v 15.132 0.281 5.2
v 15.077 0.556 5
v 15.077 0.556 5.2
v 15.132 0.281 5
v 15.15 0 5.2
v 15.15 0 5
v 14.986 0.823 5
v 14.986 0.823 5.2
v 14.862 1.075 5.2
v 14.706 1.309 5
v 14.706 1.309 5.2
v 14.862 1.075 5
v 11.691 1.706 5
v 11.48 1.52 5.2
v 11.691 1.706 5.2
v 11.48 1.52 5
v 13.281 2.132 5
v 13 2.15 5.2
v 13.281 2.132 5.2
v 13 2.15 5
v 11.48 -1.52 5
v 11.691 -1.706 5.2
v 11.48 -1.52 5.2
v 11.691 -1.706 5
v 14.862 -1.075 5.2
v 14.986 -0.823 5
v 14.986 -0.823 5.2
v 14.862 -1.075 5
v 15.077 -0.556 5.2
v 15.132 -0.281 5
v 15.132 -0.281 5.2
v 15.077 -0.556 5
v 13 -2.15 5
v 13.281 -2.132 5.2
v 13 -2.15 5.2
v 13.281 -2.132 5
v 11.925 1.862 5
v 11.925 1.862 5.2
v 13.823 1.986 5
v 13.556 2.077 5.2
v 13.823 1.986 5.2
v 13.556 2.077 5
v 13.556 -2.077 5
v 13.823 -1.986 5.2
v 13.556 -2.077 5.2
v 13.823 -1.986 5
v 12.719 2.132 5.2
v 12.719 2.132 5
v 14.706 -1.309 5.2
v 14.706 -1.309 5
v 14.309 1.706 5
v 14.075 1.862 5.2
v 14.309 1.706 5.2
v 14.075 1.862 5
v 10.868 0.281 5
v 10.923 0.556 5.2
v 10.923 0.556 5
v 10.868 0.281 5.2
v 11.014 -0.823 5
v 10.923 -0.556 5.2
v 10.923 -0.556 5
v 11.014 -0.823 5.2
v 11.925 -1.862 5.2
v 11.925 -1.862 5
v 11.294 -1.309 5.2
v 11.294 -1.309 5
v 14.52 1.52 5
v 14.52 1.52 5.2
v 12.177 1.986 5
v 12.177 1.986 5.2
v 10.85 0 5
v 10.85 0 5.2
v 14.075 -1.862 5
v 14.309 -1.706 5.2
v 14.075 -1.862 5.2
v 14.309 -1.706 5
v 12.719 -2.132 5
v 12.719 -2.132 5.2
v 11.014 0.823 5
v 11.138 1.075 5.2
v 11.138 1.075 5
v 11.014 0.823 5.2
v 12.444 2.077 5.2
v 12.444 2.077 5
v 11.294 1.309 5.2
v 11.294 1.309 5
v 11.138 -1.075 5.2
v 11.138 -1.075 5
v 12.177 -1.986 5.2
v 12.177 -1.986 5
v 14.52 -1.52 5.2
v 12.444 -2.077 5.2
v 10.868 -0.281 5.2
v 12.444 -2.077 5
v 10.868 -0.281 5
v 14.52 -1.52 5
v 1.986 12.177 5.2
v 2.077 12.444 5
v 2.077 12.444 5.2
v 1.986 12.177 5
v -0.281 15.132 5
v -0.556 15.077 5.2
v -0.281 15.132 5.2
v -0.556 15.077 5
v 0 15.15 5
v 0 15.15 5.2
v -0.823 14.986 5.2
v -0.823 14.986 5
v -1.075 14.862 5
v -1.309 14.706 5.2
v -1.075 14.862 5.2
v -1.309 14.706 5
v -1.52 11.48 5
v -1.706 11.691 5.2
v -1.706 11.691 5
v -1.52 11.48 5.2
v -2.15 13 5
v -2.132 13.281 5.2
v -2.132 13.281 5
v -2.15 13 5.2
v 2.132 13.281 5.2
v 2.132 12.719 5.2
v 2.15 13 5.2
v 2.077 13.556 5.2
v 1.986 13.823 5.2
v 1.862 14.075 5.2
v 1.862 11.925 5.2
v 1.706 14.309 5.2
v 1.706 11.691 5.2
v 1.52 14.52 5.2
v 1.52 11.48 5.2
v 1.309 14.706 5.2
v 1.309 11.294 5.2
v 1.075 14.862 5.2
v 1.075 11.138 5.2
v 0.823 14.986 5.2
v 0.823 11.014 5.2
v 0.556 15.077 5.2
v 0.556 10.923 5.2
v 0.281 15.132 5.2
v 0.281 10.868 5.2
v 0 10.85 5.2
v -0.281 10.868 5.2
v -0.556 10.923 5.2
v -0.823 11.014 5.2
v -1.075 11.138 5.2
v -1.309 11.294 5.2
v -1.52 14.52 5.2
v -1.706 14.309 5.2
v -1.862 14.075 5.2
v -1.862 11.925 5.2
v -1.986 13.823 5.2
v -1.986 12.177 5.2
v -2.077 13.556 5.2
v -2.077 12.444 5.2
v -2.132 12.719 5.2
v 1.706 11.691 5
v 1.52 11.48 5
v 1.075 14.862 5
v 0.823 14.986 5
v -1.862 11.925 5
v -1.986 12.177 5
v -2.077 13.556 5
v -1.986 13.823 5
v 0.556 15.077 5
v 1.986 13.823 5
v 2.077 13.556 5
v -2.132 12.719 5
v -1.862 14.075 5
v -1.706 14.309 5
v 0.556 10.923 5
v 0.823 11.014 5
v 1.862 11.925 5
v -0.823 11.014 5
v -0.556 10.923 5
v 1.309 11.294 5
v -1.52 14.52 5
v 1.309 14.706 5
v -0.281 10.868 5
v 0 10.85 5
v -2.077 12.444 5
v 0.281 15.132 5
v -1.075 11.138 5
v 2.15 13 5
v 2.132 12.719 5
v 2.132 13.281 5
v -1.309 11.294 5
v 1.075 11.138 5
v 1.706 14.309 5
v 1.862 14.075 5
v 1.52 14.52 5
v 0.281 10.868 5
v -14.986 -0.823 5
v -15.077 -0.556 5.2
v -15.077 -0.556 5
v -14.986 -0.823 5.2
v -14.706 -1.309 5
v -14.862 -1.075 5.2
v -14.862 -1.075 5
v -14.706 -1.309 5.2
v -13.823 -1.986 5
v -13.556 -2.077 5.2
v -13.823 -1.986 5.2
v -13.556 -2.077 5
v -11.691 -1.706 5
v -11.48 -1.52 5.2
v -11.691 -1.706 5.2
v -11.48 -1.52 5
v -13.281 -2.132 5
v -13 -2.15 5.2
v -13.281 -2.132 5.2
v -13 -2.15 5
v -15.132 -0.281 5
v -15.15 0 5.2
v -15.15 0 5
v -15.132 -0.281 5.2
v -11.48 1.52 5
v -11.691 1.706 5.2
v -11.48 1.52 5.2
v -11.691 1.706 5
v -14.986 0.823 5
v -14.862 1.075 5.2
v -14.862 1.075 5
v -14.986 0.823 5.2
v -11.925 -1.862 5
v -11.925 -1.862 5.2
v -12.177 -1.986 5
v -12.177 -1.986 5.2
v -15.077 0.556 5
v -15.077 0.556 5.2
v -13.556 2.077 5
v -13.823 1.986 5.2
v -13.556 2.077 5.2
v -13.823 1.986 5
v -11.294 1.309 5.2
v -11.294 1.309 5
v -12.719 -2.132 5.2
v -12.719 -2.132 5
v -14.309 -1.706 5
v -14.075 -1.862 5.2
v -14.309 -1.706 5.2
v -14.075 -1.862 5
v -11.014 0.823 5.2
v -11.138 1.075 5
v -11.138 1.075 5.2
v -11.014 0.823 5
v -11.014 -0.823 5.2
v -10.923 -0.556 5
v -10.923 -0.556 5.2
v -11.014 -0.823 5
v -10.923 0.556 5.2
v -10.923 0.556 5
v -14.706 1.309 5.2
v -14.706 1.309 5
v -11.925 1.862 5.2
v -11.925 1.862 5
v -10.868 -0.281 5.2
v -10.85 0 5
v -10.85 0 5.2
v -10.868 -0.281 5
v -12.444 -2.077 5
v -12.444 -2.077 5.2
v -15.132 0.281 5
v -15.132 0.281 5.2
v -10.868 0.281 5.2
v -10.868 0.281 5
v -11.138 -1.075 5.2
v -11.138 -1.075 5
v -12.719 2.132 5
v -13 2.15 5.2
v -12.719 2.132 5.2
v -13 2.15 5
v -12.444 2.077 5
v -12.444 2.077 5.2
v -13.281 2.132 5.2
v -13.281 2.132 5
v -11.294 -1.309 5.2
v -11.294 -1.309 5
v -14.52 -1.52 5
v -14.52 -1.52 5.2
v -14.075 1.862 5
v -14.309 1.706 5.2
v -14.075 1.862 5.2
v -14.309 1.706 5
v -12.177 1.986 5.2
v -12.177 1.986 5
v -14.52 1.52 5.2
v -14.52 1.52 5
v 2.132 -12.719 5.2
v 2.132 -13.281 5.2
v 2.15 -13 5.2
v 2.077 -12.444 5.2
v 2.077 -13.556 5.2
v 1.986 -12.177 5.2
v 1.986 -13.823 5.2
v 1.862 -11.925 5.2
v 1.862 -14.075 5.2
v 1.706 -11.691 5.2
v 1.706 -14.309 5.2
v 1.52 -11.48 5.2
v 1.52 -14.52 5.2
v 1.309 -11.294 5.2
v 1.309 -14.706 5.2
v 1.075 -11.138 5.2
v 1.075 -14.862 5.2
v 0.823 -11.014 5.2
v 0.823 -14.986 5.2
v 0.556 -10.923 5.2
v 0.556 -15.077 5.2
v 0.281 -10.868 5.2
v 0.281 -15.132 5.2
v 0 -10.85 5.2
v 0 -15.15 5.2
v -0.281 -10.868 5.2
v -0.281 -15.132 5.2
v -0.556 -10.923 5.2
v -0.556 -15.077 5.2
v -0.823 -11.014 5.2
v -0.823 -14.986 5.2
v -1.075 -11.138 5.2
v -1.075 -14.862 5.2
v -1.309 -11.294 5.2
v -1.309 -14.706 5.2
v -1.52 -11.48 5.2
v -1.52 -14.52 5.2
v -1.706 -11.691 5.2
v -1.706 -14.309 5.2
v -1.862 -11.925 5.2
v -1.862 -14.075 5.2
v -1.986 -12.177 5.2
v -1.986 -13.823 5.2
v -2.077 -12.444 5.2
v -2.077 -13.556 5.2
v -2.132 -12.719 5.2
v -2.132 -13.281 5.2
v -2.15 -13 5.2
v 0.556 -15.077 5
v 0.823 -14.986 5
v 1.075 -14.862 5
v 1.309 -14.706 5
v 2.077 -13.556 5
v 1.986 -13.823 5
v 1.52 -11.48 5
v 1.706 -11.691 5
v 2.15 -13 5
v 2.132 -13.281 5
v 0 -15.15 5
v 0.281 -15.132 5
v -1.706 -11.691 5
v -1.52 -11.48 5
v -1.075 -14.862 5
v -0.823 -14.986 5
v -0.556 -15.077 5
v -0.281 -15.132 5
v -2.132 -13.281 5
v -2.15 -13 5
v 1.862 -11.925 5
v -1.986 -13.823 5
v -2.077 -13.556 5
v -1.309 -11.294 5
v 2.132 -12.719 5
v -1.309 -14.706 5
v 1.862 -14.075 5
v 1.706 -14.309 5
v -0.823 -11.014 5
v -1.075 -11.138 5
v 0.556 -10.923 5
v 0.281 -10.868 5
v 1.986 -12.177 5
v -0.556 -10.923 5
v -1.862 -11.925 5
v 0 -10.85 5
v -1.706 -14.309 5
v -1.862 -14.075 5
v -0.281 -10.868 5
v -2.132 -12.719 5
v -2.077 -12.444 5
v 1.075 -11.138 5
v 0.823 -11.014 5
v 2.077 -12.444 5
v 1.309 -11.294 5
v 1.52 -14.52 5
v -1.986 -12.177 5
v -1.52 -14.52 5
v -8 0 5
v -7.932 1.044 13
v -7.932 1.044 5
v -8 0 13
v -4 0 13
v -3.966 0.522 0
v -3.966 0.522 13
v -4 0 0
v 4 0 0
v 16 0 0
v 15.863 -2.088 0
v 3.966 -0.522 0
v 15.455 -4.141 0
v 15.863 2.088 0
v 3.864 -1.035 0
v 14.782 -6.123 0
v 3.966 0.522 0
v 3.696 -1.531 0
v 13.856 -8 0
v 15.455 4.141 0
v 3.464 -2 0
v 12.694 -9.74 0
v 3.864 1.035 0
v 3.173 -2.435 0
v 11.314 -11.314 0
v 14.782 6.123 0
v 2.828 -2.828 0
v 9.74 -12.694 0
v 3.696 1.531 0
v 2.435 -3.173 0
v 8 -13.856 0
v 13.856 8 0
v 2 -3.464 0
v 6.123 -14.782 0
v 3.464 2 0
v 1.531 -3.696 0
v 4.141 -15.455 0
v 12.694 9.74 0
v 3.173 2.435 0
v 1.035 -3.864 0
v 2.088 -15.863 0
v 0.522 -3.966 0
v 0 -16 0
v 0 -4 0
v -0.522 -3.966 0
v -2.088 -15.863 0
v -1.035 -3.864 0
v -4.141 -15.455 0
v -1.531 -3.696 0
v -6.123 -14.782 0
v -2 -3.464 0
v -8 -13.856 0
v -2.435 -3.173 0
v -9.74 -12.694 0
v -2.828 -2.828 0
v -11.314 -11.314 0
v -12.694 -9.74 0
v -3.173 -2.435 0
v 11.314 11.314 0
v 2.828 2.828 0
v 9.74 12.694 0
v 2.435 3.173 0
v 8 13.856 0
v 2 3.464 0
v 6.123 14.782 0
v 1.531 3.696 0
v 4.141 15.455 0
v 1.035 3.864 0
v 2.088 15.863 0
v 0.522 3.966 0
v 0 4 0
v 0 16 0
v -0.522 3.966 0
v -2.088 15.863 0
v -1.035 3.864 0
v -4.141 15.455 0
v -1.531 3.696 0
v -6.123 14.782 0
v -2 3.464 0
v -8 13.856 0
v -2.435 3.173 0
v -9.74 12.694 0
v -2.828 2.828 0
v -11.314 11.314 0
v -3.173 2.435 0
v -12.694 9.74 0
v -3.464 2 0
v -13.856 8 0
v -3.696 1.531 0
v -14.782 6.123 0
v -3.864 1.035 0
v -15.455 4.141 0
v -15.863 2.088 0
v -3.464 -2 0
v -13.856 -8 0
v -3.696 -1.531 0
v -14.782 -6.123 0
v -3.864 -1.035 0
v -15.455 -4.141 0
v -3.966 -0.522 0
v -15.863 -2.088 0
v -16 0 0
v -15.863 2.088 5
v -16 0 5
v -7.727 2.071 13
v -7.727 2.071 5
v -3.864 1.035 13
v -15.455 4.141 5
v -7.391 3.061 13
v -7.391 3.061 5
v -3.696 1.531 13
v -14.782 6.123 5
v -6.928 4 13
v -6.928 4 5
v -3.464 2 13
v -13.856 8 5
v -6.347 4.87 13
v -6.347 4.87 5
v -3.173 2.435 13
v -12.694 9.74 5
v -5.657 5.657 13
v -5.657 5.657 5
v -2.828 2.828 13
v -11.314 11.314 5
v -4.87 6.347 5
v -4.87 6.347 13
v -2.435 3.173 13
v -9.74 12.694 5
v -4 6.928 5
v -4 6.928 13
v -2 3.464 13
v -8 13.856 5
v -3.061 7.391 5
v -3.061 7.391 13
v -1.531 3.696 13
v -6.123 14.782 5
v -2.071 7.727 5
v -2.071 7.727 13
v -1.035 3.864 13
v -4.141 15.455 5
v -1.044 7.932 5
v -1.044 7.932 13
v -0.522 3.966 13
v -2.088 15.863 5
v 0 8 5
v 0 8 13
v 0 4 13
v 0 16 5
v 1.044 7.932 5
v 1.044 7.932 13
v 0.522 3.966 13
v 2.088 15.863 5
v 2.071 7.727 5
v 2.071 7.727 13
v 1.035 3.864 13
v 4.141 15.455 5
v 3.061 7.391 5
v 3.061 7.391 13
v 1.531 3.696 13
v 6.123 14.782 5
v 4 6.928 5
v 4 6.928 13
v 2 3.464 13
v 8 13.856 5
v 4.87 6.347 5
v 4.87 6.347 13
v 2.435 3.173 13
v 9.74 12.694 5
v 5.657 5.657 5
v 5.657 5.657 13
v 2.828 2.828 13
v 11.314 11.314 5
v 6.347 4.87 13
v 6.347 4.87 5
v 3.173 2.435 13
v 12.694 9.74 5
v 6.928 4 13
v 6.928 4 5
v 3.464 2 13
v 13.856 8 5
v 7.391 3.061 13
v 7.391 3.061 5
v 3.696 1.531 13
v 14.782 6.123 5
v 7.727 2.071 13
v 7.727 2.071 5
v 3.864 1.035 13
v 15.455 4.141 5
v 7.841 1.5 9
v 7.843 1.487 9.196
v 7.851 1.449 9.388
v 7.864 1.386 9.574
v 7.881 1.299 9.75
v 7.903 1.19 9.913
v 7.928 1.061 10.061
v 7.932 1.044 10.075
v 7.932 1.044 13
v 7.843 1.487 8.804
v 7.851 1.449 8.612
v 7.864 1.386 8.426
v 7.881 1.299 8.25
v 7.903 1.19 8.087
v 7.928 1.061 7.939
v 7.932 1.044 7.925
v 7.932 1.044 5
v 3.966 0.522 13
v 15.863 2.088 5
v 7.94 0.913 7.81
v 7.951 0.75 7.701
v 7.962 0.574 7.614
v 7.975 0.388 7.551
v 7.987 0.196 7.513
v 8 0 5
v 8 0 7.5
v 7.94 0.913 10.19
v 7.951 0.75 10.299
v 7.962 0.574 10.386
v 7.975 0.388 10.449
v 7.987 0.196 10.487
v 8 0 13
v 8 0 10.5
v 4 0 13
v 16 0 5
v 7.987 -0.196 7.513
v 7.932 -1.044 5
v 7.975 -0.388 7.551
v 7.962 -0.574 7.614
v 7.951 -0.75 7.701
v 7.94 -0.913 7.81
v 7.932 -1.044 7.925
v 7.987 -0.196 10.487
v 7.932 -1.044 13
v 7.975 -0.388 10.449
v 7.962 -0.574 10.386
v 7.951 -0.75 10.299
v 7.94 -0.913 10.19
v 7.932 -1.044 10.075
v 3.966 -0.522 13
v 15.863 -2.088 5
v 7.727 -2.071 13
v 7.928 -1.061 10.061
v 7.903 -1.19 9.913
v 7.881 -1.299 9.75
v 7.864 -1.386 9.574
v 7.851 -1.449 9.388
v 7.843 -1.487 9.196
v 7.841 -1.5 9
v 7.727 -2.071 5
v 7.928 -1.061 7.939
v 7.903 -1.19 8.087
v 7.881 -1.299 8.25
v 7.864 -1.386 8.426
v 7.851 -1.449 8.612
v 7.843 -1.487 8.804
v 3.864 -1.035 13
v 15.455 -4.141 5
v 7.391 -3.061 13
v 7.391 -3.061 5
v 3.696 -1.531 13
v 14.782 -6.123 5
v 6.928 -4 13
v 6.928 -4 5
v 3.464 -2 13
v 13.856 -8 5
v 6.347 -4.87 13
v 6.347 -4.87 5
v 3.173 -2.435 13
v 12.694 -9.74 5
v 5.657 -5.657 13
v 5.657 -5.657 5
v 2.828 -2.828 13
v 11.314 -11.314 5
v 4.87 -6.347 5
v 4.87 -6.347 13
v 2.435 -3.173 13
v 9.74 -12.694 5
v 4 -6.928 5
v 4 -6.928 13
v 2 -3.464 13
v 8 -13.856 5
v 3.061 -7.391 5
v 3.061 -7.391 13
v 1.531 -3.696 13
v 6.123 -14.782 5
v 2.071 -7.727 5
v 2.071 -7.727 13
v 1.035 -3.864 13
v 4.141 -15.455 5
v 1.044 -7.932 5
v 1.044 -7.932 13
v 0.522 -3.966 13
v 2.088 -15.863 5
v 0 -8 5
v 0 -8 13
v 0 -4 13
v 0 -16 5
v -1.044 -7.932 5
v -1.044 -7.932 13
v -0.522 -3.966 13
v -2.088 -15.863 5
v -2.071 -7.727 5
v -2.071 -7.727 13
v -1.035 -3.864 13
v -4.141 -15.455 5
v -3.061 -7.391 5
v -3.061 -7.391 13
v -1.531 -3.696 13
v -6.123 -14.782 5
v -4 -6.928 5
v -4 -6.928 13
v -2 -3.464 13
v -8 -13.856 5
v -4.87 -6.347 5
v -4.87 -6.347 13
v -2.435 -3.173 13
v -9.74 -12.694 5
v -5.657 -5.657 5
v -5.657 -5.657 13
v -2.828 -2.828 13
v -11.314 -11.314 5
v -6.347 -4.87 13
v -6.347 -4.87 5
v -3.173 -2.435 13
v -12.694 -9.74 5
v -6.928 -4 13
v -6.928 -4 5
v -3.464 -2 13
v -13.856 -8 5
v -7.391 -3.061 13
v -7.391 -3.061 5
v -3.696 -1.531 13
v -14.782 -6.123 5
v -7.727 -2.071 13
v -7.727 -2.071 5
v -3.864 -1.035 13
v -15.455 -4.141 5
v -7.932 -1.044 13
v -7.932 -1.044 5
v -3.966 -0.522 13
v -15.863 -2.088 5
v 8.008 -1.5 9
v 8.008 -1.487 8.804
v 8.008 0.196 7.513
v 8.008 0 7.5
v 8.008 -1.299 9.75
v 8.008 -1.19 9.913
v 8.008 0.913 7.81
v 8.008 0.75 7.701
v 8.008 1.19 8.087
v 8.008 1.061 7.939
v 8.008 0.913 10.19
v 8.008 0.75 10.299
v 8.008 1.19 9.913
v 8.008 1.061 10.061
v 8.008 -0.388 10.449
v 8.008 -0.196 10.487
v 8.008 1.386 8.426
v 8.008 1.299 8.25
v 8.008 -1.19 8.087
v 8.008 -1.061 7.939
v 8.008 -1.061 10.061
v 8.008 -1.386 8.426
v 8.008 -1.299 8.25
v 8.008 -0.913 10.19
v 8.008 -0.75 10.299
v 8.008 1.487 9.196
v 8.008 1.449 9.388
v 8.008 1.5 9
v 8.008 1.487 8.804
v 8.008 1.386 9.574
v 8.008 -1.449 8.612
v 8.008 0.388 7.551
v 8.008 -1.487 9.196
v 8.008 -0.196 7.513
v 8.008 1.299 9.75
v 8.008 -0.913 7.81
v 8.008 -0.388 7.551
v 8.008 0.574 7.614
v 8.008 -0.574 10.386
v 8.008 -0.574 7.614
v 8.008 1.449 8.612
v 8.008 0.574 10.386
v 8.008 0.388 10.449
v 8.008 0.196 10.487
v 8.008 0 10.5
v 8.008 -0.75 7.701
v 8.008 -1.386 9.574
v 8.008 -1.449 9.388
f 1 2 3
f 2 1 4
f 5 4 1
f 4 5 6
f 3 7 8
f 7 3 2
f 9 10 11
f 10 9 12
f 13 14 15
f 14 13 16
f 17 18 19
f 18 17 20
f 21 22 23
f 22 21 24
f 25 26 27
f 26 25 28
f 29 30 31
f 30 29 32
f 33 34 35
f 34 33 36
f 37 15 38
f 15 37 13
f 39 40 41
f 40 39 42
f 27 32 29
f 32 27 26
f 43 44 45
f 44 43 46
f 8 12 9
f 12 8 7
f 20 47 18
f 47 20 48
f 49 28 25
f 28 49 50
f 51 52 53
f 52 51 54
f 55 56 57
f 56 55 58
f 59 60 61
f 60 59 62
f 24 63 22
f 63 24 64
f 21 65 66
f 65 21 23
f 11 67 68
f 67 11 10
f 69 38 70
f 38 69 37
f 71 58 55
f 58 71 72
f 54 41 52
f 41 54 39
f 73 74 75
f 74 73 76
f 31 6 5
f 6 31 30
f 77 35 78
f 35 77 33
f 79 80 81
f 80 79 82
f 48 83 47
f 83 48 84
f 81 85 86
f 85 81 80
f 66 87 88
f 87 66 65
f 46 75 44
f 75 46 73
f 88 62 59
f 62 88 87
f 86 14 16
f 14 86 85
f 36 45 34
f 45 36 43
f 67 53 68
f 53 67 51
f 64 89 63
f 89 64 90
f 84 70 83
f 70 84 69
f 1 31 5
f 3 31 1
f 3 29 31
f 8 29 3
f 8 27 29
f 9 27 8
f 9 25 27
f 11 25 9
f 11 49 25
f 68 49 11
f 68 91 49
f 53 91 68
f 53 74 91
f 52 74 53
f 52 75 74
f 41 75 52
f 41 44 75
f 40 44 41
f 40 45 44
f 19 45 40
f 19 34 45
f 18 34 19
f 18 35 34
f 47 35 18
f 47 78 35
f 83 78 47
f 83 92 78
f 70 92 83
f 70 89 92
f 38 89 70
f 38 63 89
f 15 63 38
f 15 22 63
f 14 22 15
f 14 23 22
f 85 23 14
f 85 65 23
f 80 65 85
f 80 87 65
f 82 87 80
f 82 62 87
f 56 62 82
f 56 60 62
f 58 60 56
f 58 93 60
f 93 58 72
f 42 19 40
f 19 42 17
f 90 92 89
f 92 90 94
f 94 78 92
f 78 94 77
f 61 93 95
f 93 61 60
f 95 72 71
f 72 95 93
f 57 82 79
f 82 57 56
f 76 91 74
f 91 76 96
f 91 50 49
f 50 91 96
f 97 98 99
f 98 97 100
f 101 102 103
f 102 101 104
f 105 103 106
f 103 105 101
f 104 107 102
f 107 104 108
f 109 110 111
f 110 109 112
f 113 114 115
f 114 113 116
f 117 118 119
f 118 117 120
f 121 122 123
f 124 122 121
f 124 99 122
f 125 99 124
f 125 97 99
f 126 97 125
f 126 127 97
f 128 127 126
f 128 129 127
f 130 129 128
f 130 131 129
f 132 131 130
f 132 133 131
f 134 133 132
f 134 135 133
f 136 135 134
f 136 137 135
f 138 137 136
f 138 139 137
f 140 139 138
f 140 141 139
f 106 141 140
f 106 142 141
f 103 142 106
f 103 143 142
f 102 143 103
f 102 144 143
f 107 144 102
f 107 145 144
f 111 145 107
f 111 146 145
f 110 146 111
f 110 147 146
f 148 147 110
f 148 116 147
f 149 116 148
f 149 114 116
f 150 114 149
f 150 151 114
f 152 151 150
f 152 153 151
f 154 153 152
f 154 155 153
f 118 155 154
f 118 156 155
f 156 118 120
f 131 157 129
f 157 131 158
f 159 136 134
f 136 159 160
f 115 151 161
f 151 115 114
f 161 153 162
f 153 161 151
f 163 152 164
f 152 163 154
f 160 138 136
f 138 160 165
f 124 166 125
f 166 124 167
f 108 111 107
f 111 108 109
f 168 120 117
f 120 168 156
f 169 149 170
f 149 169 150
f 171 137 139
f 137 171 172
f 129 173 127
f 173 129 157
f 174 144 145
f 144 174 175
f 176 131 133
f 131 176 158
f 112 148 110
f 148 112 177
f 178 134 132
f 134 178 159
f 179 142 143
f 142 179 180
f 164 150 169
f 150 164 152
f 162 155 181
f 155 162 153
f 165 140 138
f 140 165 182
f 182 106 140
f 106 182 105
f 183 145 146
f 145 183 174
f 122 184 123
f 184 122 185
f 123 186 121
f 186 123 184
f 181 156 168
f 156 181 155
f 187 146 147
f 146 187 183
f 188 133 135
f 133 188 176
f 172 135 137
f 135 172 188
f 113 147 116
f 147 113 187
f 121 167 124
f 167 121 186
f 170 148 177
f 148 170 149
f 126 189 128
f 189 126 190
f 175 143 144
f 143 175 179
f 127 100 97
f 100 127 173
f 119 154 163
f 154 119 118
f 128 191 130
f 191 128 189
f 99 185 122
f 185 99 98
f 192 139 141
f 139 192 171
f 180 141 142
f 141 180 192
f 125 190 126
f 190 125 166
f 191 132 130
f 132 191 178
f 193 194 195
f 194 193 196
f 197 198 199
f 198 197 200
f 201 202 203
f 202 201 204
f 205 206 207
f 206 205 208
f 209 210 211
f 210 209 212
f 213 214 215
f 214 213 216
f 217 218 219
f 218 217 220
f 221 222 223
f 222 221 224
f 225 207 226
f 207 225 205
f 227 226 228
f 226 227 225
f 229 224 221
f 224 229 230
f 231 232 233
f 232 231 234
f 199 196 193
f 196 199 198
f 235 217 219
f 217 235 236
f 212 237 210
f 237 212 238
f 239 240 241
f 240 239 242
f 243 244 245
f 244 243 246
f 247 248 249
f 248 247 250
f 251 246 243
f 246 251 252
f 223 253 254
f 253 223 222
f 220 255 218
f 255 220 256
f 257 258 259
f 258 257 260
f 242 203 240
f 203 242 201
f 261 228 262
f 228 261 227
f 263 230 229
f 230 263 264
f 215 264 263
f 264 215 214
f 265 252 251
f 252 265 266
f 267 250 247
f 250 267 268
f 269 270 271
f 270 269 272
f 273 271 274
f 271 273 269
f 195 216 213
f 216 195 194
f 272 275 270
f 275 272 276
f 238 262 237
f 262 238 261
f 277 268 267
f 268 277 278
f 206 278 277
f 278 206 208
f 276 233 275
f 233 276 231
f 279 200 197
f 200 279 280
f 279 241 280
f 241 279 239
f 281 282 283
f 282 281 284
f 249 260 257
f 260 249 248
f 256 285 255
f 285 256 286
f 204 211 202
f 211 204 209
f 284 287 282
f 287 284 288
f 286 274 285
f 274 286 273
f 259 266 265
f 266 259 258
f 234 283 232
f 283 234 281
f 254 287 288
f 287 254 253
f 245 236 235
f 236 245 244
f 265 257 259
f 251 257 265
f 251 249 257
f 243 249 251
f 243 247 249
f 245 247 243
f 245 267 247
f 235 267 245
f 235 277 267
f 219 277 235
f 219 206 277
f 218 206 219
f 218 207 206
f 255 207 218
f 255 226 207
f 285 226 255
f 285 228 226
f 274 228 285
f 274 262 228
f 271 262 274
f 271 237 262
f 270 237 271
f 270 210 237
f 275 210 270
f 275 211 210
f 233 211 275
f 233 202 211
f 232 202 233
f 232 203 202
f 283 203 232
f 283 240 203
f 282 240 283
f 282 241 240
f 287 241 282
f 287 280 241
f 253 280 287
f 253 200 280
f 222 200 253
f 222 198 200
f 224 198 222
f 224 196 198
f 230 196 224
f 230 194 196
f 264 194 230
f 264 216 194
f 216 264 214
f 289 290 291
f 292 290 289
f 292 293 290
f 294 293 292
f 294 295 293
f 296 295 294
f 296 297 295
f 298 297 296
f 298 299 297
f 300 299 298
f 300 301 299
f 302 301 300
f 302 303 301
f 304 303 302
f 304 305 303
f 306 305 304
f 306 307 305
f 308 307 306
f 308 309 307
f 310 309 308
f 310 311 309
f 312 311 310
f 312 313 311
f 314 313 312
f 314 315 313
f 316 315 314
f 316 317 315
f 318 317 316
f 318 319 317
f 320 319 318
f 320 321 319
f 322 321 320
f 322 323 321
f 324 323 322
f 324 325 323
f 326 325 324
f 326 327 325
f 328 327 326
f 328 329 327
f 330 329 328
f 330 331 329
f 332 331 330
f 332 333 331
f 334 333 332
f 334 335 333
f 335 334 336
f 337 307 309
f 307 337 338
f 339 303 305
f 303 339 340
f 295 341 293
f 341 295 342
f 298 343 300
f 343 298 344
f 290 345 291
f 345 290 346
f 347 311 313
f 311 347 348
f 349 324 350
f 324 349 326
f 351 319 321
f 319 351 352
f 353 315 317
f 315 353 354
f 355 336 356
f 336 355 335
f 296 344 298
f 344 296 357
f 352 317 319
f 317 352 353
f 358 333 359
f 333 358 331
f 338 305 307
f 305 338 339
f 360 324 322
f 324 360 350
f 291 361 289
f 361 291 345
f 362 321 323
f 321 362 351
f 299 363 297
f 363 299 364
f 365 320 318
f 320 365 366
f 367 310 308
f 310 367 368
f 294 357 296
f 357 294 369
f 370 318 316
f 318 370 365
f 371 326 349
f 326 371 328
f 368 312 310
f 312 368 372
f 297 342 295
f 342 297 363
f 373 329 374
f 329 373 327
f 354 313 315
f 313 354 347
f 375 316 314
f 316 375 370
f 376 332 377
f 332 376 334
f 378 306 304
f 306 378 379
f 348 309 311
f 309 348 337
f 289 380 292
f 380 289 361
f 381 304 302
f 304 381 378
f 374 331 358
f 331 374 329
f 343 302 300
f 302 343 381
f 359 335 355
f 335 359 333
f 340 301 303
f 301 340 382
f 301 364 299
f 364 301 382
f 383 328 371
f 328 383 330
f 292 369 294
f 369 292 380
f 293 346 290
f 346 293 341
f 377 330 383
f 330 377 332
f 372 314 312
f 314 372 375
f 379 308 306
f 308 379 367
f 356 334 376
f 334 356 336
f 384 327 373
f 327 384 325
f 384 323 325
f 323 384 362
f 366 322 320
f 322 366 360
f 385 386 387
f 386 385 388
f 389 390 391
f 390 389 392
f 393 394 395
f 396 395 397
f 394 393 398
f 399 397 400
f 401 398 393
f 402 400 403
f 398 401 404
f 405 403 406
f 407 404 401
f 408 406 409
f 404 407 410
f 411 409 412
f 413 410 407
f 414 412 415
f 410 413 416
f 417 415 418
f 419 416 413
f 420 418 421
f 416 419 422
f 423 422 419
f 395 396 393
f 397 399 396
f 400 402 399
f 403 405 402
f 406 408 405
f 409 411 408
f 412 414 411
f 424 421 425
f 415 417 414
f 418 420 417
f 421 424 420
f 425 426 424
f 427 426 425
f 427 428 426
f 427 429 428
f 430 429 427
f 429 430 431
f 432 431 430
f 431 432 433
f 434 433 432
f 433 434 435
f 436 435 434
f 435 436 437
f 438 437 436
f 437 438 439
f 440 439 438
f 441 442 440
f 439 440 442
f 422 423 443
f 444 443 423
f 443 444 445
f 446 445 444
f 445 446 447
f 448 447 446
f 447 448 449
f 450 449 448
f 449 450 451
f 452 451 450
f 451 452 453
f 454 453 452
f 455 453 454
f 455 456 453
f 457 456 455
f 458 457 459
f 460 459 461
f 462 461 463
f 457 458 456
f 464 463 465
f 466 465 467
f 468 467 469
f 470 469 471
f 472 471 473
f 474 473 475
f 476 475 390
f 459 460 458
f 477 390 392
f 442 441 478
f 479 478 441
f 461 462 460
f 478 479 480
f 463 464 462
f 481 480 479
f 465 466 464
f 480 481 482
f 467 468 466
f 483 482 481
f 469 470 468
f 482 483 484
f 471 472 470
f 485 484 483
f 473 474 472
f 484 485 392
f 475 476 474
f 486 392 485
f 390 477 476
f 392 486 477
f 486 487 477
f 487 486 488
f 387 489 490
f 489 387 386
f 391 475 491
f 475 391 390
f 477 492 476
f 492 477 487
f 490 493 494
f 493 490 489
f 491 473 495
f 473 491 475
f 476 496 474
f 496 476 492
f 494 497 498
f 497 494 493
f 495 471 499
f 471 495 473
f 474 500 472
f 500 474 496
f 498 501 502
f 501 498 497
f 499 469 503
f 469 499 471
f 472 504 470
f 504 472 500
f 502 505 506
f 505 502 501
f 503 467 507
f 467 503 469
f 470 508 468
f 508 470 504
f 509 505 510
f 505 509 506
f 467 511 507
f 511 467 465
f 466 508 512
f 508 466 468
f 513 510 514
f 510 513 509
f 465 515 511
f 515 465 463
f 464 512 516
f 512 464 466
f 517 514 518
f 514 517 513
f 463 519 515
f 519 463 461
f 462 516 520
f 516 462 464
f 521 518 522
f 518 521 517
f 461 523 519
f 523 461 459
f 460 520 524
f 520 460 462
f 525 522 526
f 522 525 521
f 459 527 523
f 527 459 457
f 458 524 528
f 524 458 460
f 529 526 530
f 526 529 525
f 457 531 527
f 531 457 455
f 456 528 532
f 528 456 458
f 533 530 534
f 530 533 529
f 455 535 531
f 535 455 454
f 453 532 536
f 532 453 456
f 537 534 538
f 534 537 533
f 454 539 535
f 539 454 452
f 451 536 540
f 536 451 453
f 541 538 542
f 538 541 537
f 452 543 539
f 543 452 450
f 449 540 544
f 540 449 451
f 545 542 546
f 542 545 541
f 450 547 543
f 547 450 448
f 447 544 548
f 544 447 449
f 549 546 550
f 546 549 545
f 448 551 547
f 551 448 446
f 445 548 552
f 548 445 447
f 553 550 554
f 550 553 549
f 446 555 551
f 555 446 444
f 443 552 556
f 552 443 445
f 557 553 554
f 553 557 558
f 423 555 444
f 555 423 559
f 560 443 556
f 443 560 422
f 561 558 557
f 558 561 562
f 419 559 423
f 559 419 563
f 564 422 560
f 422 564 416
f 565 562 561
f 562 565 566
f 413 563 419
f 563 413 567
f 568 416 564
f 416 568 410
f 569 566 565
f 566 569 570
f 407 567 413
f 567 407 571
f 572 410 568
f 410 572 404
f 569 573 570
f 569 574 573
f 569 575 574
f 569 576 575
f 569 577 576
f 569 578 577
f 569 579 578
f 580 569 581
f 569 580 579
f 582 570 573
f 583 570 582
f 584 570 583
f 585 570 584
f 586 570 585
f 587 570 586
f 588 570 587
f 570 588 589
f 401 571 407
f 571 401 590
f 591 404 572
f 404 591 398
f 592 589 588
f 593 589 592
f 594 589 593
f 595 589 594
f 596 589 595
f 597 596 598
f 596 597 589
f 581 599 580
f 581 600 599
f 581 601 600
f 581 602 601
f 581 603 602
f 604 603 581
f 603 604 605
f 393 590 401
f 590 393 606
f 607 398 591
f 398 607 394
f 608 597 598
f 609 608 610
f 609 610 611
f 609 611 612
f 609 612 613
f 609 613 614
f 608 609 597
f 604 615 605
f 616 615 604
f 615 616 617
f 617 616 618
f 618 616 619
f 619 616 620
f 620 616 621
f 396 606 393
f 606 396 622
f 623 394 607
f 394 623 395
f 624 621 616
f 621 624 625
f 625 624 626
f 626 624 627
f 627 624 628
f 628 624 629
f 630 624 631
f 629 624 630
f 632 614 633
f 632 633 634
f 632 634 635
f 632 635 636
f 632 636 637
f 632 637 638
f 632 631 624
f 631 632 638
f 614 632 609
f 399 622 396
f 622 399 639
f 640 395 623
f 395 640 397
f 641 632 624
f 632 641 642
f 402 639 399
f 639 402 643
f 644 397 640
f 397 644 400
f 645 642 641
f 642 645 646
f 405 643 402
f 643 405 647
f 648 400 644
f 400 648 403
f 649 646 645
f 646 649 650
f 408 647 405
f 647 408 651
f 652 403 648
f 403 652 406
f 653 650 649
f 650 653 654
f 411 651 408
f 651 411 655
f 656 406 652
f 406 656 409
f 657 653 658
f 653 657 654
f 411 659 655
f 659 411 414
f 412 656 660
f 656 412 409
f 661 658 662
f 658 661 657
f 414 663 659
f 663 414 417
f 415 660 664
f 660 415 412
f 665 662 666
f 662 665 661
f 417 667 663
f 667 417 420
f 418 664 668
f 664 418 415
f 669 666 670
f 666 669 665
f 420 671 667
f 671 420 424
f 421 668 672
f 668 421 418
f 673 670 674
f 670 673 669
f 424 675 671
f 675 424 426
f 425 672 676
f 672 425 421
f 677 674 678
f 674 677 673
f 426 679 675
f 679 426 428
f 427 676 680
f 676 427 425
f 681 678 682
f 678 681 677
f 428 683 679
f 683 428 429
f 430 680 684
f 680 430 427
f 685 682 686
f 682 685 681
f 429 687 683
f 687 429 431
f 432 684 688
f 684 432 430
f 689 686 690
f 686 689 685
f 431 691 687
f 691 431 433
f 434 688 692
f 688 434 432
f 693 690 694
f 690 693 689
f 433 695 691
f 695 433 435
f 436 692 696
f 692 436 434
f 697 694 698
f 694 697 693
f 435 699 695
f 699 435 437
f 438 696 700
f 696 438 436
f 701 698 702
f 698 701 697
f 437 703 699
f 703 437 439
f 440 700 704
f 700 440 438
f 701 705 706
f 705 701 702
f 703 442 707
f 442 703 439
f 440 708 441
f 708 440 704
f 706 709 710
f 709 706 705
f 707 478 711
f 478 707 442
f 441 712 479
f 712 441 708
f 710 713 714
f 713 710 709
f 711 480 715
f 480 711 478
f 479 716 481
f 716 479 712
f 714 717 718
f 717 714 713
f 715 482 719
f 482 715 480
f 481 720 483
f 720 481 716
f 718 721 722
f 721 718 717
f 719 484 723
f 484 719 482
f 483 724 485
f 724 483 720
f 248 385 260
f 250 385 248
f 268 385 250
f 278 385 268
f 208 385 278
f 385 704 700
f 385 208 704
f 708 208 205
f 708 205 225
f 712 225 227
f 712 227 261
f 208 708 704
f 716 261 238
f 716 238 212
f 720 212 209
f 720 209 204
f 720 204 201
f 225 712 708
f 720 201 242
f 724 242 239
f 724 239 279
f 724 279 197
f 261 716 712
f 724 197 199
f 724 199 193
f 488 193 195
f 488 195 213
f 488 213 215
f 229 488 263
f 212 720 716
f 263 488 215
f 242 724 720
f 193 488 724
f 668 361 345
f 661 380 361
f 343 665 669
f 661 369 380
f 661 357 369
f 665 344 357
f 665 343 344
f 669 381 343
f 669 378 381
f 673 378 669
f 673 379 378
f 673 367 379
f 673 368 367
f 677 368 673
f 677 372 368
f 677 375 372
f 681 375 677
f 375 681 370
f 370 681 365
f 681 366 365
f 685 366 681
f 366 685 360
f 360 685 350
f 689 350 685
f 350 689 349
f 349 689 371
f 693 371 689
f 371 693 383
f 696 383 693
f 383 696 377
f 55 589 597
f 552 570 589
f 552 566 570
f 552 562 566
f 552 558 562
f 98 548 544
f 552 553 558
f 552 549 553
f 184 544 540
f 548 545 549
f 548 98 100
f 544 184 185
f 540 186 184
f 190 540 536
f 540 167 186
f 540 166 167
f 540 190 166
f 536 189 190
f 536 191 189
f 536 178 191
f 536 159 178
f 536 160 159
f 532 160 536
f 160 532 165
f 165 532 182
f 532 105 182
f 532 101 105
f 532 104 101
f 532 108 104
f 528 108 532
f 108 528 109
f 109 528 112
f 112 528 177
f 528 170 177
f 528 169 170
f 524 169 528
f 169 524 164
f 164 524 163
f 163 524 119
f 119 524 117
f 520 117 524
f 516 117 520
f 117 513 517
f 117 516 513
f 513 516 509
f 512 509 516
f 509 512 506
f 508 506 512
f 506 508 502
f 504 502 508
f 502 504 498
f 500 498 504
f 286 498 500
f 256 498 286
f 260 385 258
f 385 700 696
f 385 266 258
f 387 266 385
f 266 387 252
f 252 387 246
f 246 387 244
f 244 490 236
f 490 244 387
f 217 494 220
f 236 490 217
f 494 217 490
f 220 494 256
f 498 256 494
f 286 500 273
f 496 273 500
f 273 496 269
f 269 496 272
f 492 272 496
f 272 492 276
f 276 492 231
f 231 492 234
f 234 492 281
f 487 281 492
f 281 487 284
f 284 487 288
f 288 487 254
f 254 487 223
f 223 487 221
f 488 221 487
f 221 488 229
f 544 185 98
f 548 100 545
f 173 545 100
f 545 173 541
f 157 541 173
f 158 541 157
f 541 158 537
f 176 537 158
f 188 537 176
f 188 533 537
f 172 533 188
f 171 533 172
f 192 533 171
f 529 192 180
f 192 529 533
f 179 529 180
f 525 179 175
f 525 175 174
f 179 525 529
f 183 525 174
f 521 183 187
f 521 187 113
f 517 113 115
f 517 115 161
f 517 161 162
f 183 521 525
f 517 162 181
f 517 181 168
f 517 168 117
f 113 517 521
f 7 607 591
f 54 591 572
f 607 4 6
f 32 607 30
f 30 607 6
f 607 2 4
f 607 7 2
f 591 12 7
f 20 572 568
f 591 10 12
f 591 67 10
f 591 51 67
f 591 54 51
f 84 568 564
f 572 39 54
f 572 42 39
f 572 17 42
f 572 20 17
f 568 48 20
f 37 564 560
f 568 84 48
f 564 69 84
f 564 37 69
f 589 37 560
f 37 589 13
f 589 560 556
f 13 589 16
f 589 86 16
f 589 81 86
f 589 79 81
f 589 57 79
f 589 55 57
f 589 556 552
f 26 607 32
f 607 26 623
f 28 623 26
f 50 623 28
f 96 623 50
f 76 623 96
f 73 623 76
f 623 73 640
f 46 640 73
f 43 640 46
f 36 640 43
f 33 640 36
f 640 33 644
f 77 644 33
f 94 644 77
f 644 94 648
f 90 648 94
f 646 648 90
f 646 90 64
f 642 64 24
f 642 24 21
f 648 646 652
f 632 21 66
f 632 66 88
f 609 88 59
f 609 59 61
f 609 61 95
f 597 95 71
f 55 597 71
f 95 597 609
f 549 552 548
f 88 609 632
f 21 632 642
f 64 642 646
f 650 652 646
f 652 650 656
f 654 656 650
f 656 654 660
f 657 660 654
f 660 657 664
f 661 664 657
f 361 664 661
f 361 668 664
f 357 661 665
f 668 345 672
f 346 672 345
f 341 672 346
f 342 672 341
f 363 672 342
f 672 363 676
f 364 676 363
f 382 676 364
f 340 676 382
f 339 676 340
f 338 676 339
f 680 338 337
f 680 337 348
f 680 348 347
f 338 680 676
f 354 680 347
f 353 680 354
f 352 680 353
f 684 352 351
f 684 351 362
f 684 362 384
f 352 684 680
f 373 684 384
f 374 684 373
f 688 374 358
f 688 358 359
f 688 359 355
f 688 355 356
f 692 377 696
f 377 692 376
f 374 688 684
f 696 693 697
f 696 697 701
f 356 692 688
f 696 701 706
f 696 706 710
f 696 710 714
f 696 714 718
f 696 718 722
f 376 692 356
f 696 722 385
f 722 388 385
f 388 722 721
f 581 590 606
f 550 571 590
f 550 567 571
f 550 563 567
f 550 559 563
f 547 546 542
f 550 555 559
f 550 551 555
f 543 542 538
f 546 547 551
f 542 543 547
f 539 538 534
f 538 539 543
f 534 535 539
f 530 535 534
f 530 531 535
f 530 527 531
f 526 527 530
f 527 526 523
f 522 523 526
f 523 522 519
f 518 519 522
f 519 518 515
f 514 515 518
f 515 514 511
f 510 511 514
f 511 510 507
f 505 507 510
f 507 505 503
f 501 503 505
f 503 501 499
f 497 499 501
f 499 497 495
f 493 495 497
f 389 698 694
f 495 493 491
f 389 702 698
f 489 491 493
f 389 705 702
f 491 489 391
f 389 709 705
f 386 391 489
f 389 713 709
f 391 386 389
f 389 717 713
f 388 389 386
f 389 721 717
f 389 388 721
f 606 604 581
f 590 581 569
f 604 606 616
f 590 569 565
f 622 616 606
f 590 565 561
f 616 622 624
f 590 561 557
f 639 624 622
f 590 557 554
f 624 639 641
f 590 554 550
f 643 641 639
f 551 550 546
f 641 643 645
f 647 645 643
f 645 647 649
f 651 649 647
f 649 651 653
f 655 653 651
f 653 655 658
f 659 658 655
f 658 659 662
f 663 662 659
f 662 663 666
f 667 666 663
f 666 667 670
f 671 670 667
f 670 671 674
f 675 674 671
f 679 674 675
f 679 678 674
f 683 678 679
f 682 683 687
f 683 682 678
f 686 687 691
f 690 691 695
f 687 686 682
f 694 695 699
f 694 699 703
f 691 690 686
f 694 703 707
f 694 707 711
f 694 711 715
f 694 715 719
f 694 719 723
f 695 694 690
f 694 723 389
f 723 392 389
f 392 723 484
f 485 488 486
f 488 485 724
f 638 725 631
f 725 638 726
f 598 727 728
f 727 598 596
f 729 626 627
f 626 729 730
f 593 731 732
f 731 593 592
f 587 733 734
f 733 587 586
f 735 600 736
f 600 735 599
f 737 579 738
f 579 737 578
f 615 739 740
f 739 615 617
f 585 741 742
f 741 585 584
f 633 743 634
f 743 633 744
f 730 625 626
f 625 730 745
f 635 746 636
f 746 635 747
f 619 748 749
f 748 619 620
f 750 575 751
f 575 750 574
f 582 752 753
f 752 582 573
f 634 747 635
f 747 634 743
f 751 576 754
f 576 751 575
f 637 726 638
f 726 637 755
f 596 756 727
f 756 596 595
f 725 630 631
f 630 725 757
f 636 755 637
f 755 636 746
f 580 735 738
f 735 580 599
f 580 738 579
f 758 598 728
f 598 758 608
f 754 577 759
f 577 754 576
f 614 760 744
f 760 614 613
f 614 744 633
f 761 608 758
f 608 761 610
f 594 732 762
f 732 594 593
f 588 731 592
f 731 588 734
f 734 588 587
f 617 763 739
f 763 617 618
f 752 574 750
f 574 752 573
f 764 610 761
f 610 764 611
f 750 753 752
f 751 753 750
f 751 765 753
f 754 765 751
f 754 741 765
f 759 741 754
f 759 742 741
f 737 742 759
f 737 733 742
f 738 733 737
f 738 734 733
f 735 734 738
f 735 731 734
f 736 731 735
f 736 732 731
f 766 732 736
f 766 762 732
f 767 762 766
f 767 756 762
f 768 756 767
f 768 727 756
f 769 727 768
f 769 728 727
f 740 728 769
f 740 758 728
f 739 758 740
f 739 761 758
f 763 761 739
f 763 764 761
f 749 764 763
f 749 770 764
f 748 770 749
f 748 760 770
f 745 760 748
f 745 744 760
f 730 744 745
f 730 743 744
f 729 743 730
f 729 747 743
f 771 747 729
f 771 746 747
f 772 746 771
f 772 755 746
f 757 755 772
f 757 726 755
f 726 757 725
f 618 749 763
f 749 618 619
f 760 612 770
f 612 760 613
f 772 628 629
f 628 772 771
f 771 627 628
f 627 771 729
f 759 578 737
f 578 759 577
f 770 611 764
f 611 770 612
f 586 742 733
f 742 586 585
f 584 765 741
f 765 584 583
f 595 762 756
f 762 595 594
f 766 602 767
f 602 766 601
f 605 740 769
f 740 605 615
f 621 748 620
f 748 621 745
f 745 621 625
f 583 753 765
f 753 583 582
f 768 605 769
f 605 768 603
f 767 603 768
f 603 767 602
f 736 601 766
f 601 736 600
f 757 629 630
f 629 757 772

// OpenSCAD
// file: ../config.scad
// SCARA 로봇 공통 사양(specification) — 모든 부품 파일에서 include해 사용한다.

$fn = 48;

// ── 공차(tolerance) ──
print_clearance = 0.2;   // FDM 출력 끼워맞춤(fit) 여유 — 압입(press-fit) 자리 제외
eps             = 1/128; // 미세 겹침(epsilon) — 접하는 솔리드를 살짝 겹쳐 동일면(coincident face) z-파이팅 방지

// ── FDM 출력 사양(print specification) ──
fdm_layer_h       = 0.28;   // 레이어 높이(layer height) — 슬라이서(slicer) 설정값과 일치시킨다.
fdm_shoulder_layers = 6;   // 숄더(shoulder) 최소 레이어 수 — FDM 최소 구조 벽(0.4mm 노즐 3겹 ~1.2mm) 기준 하한값.

// ── 레이아웃(layout) ──
// layout_margin — 플레이트 위 부품 배치 공통 여백(margin). 부품 외곽선에서
// 사방으로 주는 값 → 부품끼리는 2*margin 이격, 외곽 가장자리도 margin 확보.
layout_margin = 4;

// ── 시트 형상(seat geometry) ──
// seat_shoulder_t — fdm_layer_h · fdm_shoulder_layers 파생. 슬라이서 설정 변경 시 자동 연동.
seat_shoulder_t = fdm_layer_h * fdm_shoulder_layers;
// main file
/*
 * flange_couplings.scad - 플랜지 커플링(flange coupling) 기성품(vitamin)
 *
 * 매끈 봉(round shaft)을 중앙 허브(hub)의 멈춤나사(grub screw)로 죄고, 볼트원
 * (bolt circle)이 있는 원형 플랜지를 판에 평면 체결해 봉을 판에 수직으로
 * 고정한다. SCARA_KINEMATICS.md의 COLUMN_LINK에서 가이드 로드(guide rod) 끝을
 * 가이드 플레이트에 고정(FLANGE_COUPLINGS)한다. NopSCADlib에 없어 로컬로 둔다.
 *
 * Z 브레이크포인트(Z breakpoint) 최적화: 회전 대칭인 플랜지+허브+보어를 환형
 * (annular) 단면 한 개의 rotate_extrude로 만든다. 볼트 홀·멈춤나사는
 * difference 없이 어두운 마커(marker)로 배치한다.
 *
 * 좌표계: 봉 축(axis) = Z, 플랜지 바닥(판 접촉면) = z=0, 허브는 +z.
 */

include <../config.scad>

/* --- 색상(cosmetic) --- */
c_body		= [0.74, 0.75, 0.77];	/* 아연도금강(zinc steel) 본체 */
c_hole		= [0.12, 0.12, 0.13];	/* 볼트 홀·멈춤나사 음각 마커 */

/*
 * 플랜지 커플링(제네릭) — 보어·플랜지·볼트원·허브 치수를 받는다. 회전체는
 * 환형 단면 단일 rotate_extrude, 볼트 홀·멈춤나사 마커는 그대로 배치한다.
 *   bore_d        봉 보어(shaft bore) 지름
 *   flange_d/t    플랜지 외경·두께
 *   bolt_circle_d 마운팅 볼트원(bolt circle) 지름
 *   bolt_n        마운팅 홀 개수
 *   hub_d/h       클램프 허브 외경·높이(플랜지 위)
 */
module flange_coupling(bore_d, flange_d, flange_t, bolt_circle_d, bolt_n,
		       hub_d, hub_h)
{
	br	= bore_d / 2;
	top	= flange_t + hub_h;
	bolt_mark_d = 4.3;	/* 마운팅 홀 마커 — M4 클리어런스 */
	grub_mark_d = 3;	/* 멈춤나사 마커 — M4 grub */

	/* 플랜지 + 허브 + 보어 — 환형 단면 단일 회전체 */
	color(c_body)
		rotate_extrude(convexity = 4)
			polygon([[br, 0], [flange_d / 2, 0],
				 [flange_d / 2, flange_t],
				 [hub_d / 2, flange_t],
				 [hub_d / 2, top], [br, top]]);

	/* 마운팅 볼트 홀 마커 ×n — 플랜지 윗면 볼트원에 배치 */
	color(c_hole)
		for (i = [0 : bolt_n - 1])
			rotate([0, 0, i * 360 / bolt_n])
				translate([bolt_circle_d / 2, 0, flange_t - eps])
					cylinder(h = 0.2 + eps, d = bolt_mark_d);

	/* 멈춤나사 마커 — 허브 옆면에서 봉을 반경으로 죄는 자리 */
	color(c_hole)
		translate([hub_d / 2 - 1, 0, flange_t + hub_h / 2])
			rotate([0, 90, 0])
				cylinder(h = 1 + eps, d = grub_mark_d);
}

/* --- 표준 변형(convenience) — FC8(보어 8, 가이드 로드 끝 고정) --- */
module fc8() { flange_coupling(8, 32, 5, 26, 4, 16, 8); }

fc8();
